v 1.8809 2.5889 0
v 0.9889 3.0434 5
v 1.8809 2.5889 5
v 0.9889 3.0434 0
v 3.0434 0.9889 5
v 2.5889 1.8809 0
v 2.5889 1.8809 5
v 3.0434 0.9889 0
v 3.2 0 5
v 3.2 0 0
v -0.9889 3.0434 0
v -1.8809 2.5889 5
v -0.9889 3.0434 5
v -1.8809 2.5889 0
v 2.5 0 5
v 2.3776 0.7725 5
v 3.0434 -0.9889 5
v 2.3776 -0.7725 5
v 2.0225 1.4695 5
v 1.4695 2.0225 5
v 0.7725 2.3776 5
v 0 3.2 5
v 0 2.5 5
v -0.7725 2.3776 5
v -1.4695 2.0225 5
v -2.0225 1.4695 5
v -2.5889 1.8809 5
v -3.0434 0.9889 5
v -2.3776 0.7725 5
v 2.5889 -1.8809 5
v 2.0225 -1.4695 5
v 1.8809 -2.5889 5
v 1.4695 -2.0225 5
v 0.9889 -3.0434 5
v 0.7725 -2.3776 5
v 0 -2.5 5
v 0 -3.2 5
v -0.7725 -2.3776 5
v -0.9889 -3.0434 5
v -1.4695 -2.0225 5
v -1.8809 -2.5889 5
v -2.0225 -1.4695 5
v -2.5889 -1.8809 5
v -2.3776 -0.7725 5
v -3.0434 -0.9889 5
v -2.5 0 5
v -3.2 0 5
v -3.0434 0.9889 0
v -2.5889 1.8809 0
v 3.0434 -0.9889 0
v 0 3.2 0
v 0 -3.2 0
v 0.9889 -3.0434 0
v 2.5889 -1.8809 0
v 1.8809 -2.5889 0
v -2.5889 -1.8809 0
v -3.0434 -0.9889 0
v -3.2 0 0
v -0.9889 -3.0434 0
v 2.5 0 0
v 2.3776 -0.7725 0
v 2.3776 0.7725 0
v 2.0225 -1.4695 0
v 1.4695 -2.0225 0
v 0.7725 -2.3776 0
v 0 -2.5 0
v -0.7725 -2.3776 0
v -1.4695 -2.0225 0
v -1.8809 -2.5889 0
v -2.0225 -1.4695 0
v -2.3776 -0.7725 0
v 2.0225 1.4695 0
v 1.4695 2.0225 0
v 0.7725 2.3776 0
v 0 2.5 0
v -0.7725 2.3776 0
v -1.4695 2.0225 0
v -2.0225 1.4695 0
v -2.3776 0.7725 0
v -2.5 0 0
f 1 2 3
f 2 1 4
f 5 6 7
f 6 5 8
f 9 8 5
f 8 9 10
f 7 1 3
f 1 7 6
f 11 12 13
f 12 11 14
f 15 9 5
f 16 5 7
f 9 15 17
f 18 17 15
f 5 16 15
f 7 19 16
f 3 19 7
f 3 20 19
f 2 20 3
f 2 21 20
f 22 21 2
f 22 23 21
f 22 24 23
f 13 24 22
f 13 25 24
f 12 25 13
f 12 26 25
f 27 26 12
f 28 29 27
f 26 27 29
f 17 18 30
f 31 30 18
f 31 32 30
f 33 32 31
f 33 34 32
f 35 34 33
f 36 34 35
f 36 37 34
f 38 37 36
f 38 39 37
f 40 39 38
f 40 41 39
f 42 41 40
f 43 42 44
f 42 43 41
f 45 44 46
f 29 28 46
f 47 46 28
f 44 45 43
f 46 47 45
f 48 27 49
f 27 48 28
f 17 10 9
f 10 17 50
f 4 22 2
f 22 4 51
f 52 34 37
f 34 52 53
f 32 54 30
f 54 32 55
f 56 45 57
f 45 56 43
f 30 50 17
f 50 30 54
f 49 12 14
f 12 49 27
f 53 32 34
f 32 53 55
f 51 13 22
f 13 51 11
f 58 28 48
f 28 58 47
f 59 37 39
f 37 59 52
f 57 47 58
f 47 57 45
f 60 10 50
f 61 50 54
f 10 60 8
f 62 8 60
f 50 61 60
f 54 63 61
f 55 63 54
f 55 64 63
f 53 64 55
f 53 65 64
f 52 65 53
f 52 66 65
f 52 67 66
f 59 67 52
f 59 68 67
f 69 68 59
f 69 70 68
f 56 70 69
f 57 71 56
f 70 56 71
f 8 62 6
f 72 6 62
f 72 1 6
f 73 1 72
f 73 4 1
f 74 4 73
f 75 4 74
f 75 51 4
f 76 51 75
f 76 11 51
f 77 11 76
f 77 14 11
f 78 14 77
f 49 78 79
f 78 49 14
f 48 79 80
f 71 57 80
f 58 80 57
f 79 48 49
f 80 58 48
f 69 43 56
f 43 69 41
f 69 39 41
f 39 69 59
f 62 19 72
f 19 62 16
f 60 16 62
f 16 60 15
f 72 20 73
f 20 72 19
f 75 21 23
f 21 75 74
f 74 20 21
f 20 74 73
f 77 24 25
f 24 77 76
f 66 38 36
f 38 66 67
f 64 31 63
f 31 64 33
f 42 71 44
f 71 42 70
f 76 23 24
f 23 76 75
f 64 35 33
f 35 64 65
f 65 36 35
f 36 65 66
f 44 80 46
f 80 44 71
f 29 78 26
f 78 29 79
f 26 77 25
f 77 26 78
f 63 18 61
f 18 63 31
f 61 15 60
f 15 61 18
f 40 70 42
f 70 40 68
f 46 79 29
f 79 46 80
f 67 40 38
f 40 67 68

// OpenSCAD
$fn=20;
difference()
{
    cylinder(r=3.2,h=5);
    cylinder(r=2.5,h=5);
}
